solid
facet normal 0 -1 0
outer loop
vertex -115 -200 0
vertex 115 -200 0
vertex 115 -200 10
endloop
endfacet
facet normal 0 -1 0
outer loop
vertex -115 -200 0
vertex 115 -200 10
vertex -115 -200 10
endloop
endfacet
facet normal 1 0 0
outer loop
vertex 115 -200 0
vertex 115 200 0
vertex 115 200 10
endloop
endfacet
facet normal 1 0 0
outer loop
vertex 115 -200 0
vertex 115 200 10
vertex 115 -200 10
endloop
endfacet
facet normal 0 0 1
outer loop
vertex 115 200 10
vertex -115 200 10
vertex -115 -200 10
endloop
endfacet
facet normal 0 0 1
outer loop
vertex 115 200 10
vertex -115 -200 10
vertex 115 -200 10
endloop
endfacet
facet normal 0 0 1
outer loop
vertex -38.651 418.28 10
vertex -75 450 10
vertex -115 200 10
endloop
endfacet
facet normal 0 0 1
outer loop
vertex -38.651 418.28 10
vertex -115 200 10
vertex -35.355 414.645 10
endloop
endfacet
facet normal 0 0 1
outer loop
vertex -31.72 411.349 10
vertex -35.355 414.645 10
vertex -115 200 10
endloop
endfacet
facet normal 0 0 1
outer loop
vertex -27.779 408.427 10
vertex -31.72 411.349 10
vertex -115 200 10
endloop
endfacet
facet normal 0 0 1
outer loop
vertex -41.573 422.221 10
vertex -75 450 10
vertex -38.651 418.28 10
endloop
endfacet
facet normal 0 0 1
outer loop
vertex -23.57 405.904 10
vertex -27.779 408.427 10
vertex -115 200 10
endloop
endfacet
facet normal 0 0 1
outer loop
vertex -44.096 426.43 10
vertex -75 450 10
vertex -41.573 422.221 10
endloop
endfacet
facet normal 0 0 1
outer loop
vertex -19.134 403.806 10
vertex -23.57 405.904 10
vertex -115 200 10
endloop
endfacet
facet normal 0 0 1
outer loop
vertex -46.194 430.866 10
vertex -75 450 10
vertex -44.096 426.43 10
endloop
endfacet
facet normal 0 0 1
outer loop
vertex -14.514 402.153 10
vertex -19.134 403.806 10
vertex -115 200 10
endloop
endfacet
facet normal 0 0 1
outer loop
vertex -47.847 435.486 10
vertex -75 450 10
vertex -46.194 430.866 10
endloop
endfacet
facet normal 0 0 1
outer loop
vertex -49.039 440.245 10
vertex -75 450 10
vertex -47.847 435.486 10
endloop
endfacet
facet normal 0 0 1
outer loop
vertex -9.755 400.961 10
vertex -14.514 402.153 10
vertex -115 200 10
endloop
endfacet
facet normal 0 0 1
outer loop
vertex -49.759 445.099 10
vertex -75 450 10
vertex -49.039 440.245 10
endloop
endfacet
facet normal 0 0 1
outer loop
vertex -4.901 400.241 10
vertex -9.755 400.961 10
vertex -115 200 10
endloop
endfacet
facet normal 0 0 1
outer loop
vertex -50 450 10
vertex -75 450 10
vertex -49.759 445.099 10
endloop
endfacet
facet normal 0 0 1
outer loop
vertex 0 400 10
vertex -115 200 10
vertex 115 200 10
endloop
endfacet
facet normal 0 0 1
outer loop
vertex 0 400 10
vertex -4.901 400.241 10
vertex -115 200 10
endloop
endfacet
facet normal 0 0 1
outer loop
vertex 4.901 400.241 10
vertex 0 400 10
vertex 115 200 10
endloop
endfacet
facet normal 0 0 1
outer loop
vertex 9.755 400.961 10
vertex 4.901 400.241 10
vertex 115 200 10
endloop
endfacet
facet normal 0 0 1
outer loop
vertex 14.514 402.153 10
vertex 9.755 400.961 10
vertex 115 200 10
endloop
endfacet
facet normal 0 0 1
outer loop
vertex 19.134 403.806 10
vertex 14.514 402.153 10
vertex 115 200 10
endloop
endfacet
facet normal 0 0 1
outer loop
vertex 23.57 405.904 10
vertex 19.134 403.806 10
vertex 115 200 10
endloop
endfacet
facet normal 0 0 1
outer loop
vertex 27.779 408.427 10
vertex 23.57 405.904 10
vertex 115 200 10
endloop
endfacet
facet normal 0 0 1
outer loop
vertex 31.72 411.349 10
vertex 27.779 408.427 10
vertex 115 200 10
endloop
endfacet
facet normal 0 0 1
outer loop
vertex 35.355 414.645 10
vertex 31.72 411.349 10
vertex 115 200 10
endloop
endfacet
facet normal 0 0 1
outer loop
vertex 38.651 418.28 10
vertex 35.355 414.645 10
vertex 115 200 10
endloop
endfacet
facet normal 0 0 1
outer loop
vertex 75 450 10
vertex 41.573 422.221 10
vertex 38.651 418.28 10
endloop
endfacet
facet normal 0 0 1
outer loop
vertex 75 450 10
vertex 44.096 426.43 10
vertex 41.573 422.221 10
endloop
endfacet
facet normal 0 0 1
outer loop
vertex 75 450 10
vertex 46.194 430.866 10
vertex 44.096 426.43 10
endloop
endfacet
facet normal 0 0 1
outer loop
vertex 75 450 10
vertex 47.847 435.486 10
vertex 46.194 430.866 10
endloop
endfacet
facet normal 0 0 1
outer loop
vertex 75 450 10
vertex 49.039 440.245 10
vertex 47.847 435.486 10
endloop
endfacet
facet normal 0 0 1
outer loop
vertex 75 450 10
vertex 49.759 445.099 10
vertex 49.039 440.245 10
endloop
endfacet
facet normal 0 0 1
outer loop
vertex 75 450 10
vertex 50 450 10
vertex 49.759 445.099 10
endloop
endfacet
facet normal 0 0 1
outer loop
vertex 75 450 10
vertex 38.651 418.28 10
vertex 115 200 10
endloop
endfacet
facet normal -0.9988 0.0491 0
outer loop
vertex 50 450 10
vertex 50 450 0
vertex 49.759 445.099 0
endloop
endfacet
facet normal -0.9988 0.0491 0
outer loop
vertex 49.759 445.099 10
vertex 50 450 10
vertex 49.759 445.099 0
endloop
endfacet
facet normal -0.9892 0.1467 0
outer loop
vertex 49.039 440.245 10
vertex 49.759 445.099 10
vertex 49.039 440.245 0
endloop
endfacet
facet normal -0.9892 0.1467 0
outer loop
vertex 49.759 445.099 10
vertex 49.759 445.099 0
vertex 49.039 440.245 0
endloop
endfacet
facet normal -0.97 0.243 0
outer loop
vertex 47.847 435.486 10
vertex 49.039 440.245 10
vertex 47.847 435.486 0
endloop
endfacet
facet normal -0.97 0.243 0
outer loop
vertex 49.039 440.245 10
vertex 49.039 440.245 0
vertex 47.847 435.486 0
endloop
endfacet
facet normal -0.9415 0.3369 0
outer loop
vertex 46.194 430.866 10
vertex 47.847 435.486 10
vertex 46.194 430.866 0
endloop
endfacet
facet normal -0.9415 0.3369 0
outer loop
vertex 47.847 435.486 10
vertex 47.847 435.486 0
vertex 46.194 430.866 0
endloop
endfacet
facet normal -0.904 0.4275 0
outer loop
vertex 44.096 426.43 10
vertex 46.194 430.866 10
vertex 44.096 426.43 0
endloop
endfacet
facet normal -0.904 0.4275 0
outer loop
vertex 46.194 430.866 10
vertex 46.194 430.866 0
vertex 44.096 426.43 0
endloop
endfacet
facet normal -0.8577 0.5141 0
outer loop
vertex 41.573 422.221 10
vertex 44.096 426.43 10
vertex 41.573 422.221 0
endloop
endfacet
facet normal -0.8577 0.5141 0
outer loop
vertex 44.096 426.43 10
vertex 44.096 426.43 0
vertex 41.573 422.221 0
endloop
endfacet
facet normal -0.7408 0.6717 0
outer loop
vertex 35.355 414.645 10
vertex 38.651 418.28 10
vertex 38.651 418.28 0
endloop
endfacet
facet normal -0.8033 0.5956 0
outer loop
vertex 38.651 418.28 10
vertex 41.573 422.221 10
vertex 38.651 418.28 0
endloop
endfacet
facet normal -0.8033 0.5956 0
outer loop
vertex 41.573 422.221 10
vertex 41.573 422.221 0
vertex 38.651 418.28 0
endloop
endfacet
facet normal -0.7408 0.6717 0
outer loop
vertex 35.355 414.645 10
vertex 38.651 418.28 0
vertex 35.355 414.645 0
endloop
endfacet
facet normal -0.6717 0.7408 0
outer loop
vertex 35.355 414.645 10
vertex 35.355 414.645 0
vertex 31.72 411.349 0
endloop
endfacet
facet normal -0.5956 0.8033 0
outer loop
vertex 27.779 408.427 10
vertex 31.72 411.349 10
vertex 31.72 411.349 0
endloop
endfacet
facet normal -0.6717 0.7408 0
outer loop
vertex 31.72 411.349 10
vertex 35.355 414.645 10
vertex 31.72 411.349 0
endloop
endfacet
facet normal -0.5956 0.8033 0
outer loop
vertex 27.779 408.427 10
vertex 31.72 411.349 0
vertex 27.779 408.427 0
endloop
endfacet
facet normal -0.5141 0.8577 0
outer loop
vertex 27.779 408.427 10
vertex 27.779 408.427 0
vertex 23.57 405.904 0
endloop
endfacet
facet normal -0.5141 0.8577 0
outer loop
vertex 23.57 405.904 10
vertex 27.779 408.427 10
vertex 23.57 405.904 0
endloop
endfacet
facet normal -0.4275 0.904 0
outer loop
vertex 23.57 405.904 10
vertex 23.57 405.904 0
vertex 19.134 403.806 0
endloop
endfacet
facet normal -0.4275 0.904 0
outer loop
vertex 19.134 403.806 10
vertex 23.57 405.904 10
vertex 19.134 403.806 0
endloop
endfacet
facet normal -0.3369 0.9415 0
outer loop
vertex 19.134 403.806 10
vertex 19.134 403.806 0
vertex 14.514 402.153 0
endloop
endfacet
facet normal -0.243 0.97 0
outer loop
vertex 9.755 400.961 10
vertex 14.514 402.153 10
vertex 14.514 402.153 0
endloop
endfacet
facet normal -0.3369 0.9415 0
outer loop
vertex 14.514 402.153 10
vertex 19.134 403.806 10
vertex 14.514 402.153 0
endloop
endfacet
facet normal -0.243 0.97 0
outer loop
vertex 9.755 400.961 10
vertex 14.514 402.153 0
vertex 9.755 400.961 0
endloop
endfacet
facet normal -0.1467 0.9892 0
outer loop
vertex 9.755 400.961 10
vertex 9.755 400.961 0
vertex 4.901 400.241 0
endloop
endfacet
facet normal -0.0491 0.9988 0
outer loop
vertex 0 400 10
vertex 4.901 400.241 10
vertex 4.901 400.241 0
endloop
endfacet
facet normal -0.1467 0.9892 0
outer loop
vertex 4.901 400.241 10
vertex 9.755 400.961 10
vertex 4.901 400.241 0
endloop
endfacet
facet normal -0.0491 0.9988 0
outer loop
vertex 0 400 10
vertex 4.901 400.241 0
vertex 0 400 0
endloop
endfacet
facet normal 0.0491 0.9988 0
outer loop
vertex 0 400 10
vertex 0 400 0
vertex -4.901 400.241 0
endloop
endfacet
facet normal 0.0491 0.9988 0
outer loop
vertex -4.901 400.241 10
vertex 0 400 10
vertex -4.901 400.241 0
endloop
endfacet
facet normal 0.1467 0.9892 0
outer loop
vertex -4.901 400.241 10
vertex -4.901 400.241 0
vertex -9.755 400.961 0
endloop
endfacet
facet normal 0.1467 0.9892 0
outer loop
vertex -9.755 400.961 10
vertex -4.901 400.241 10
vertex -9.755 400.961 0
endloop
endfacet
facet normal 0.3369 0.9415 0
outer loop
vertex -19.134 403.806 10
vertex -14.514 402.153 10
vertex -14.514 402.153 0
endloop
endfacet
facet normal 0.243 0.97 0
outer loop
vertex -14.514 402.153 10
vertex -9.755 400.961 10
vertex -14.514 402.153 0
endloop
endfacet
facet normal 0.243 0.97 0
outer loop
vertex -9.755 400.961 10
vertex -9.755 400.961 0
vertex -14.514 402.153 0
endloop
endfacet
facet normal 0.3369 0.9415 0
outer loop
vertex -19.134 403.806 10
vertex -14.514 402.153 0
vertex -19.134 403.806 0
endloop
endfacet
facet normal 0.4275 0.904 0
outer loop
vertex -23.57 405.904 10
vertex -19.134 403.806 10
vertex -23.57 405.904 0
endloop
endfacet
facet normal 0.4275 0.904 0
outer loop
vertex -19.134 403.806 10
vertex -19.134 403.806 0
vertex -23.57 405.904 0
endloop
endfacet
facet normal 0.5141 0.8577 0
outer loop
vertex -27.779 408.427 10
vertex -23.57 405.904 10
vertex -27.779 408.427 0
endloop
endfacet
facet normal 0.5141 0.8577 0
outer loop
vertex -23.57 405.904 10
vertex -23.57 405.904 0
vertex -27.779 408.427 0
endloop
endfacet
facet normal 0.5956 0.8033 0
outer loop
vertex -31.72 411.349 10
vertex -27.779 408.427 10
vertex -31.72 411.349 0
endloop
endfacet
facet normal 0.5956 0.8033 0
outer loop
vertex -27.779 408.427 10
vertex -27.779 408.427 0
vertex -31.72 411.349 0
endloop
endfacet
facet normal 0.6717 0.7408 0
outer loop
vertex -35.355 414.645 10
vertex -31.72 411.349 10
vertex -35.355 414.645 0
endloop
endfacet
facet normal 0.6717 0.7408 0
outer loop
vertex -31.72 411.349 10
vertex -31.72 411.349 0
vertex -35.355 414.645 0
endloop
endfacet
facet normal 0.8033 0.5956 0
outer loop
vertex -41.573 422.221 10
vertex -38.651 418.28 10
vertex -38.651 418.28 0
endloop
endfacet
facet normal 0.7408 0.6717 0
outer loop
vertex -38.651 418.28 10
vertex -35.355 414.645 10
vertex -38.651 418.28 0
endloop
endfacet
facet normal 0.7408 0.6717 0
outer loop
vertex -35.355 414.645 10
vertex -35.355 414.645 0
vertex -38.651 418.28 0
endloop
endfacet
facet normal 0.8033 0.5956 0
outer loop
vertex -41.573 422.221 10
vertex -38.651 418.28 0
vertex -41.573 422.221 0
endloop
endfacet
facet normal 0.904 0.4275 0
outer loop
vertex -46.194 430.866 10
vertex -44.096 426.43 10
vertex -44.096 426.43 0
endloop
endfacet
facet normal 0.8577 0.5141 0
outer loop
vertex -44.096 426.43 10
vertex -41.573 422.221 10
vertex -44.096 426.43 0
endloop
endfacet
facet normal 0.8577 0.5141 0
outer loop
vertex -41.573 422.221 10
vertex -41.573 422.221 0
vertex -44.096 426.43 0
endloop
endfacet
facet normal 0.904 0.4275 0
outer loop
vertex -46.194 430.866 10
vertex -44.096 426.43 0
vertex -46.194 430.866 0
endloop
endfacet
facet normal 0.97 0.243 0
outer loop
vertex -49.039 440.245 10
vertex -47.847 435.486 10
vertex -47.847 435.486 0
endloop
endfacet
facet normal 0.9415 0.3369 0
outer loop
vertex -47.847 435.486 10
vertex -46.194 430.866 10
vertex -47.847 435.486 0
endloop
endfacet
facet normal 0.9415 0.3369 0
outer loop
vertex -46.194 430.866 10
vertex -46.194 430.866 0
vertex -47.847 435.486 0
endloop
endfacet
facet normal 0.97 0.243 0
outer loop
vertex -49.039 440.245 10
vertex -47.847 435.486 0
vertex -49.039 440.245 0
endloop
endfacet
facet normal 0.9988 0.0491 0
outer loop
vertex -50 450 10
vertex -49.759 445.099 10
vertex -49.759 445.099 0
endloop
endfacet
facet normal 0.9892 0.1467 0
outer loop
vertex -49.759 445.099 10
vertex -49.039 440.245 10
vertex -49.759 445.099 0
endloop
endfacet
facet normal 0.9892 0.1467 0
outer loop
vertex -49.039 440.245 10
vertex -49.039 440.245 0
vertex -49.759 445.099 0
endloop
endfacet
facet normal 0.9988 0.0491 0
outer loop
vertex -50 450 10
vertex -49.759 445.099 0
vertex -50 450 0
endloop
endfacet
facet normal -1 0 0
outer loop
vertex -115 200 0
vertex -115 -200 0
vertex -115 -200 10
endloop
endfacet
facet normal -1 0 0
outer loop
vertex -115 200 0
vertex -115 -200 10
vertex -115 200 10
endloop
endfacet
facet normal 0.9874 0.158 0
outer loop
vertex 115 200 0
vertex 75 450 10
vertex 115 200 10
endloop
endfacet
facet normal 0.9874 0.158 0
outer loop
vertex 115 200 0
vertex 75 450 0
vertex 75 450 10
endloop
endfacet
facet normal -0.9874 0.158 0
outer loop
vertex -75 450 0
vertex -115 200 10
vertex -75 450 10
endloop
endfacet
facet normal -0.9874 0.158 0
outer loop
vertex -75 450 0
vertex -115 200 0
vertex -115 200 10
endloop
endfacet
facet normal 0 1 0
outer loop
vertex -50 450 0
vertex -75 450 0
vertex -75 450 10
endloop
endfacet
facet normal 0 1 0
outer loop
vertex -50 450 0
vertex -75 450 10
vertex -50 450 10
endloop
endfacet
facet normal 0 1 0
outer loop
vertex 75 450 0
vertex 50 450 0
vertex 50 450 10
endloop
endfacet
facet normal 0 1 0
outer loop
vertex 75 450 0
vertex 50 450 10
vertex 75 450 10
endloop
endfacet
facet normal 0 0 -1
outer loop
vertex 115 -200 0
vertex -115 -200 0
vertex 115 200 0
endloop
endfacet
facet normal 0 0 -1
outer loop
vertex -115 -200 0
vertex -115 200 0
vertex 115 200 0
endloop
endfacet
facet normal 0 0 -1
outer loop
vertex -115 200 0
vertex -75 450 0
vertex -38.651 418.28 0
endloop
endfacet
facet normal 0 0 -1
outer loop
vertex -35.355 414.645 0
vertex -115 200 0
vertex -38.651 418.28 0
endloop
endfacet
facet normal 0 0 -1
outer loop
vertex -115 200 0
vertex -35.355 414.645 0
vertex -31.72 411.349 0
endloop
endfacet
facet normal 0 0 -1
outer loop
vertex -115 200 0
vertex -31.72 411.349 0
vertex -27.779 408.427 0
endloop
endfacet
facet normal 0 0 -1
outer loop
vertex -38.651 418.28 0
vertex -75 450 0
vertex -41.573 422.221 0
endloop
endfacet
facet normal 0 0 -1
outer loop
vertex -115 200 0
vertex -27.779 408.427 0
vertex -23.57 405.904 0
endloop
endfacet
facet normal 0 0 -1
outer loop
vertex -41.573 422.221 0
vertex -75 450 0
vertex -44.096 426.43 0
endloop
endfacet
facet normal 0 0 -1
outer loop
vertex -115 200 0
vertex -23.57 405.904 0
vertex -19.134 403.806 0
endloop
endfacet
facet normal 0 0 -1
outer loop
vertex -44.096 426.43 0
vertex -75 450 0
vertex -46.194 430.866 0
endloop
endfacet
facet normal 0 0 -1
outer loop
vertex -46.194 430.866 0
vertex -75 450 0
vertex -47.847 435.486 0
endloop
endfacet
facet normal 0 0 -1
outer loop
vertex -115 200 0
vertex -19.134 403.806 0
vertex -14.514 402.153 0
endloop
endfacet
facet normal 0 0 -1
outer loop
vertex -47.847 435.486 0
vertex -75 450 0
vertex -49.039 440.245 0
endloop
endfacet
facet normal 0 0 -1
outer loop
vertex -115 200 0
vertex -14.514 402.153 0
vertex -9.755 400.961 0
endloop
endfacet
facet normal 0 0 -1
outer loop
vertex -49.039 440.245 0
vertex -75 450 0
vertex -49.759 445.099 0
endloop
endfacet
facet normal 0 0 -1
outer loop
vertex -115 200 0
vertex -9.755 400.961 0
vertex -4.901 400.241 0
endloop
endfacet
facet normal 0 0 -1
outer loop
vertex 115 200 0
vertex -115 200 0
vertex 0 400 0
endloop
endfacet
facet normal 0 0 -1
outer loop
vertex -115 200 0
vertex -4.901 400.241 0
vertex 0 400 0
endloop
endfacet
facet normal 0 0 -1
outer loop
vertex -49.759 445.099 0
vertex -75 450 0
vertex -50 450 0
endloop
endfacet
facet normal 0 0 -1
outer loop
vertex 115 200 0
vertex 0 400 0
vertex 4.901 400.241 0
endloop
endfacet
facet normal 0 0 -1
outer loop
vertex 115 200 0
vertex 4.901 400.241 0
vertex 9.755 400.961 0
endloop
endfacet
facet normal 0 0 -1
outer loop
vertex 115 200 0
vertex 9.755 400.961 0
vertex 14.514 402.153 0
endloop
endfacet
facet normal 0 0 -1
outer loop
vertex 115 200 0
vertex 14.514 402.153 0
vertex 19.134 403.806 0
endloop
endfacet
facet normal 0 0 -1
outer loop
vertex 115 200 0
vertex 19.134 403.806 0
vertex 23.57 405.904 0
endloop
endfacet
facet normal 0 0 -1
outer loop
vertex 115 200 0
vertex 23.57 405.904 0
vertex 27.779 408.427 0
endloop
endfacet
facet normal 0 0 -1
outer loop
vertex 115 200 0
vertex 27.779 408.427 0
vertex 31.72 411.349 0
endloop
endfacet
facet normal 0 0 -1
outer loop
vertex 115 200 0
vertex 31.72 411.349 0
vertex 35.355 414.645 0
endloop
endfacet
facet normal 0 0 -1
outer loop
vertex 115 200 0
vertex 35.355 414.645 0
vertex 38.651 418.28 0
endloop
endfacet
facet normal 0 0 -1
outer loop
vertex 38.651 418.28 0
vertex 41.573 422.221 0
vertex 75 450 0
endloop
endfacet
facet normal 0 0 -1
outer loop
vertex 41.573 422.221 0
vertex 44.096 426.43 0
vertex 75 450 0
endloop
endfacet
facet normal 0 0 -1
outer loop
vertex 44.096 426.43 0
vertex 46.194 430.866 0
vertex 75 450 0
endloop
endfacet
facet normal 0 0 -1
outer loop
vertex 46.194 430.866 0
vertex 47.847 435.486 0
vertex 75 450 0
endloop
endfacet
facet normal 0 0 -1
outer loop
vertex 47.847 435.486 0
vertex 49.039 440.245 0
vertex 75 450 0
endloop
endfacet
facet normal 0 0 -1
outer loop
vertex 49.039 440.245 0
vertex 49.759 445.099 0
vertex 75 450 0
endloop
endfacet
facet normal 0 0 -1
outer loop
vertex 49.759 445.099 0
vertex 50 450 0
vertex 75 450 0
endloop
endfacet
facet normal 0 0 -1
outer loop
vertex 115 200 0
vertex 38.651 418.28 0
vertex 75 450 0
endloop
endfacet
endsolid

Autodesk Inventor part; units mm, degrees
ref_plane "YZ Plane" through (0, 0, 0) normal (1, 0, 0) x (0, 1, 0)
ref_plane "XZ Plane" through (0, 0, 0) normal (0, 1, 0) x (-1, 0, 0)
ref_plane "XY Plane" through (0, 0, 0) normal (0, 0, 1) x (1, 0, 0)
sketch "Sketch1" plane through (0, 0, 0) normal (0, 0, 1) x (1, 0, 0)
  line L0 (115, 200) -> (115, -200)
  line L1 (115, -200) -> (-115, -200)
  line L2 (-115, -200) -> (-115, 200)
  arc A0 (-50, 450) -> (50, 450) centre (0, 450) ccw
  line L3 (-115, 200) -> (-75, 450)
  line L4 (75, 450) -> (115, 200)
  line L5 (-75, 450) -> (-50, 450)
  line L6 (50, 450) -> (75, 450)
  point P0 (0, 0)
  dimension "d1" = 400
  dimension "d2" = 115
  dimension "d3" = 200
  dimension "d6" = 100
  dimension "d9" = 150
  dimension "d10" = 25
  dimension "d11" = 25
  dimension "d14" = 450
  dimension "d15" = 230
  dimension "d16" = 170.91
  dimension "d17" = 170.91
  dimension "d18" = 450
  dimension "d19" = 450
  dimension "d20" = 115
extrude "Extrusion1" add sketch "Sketch1" along normal blind 10
equation "\"d2\" = 0.5 * d0"
equation "\"d3\" = 0.5 * d1"
equation "\"d0\" = 230"
properties part number "Suporte" material "Lead"
